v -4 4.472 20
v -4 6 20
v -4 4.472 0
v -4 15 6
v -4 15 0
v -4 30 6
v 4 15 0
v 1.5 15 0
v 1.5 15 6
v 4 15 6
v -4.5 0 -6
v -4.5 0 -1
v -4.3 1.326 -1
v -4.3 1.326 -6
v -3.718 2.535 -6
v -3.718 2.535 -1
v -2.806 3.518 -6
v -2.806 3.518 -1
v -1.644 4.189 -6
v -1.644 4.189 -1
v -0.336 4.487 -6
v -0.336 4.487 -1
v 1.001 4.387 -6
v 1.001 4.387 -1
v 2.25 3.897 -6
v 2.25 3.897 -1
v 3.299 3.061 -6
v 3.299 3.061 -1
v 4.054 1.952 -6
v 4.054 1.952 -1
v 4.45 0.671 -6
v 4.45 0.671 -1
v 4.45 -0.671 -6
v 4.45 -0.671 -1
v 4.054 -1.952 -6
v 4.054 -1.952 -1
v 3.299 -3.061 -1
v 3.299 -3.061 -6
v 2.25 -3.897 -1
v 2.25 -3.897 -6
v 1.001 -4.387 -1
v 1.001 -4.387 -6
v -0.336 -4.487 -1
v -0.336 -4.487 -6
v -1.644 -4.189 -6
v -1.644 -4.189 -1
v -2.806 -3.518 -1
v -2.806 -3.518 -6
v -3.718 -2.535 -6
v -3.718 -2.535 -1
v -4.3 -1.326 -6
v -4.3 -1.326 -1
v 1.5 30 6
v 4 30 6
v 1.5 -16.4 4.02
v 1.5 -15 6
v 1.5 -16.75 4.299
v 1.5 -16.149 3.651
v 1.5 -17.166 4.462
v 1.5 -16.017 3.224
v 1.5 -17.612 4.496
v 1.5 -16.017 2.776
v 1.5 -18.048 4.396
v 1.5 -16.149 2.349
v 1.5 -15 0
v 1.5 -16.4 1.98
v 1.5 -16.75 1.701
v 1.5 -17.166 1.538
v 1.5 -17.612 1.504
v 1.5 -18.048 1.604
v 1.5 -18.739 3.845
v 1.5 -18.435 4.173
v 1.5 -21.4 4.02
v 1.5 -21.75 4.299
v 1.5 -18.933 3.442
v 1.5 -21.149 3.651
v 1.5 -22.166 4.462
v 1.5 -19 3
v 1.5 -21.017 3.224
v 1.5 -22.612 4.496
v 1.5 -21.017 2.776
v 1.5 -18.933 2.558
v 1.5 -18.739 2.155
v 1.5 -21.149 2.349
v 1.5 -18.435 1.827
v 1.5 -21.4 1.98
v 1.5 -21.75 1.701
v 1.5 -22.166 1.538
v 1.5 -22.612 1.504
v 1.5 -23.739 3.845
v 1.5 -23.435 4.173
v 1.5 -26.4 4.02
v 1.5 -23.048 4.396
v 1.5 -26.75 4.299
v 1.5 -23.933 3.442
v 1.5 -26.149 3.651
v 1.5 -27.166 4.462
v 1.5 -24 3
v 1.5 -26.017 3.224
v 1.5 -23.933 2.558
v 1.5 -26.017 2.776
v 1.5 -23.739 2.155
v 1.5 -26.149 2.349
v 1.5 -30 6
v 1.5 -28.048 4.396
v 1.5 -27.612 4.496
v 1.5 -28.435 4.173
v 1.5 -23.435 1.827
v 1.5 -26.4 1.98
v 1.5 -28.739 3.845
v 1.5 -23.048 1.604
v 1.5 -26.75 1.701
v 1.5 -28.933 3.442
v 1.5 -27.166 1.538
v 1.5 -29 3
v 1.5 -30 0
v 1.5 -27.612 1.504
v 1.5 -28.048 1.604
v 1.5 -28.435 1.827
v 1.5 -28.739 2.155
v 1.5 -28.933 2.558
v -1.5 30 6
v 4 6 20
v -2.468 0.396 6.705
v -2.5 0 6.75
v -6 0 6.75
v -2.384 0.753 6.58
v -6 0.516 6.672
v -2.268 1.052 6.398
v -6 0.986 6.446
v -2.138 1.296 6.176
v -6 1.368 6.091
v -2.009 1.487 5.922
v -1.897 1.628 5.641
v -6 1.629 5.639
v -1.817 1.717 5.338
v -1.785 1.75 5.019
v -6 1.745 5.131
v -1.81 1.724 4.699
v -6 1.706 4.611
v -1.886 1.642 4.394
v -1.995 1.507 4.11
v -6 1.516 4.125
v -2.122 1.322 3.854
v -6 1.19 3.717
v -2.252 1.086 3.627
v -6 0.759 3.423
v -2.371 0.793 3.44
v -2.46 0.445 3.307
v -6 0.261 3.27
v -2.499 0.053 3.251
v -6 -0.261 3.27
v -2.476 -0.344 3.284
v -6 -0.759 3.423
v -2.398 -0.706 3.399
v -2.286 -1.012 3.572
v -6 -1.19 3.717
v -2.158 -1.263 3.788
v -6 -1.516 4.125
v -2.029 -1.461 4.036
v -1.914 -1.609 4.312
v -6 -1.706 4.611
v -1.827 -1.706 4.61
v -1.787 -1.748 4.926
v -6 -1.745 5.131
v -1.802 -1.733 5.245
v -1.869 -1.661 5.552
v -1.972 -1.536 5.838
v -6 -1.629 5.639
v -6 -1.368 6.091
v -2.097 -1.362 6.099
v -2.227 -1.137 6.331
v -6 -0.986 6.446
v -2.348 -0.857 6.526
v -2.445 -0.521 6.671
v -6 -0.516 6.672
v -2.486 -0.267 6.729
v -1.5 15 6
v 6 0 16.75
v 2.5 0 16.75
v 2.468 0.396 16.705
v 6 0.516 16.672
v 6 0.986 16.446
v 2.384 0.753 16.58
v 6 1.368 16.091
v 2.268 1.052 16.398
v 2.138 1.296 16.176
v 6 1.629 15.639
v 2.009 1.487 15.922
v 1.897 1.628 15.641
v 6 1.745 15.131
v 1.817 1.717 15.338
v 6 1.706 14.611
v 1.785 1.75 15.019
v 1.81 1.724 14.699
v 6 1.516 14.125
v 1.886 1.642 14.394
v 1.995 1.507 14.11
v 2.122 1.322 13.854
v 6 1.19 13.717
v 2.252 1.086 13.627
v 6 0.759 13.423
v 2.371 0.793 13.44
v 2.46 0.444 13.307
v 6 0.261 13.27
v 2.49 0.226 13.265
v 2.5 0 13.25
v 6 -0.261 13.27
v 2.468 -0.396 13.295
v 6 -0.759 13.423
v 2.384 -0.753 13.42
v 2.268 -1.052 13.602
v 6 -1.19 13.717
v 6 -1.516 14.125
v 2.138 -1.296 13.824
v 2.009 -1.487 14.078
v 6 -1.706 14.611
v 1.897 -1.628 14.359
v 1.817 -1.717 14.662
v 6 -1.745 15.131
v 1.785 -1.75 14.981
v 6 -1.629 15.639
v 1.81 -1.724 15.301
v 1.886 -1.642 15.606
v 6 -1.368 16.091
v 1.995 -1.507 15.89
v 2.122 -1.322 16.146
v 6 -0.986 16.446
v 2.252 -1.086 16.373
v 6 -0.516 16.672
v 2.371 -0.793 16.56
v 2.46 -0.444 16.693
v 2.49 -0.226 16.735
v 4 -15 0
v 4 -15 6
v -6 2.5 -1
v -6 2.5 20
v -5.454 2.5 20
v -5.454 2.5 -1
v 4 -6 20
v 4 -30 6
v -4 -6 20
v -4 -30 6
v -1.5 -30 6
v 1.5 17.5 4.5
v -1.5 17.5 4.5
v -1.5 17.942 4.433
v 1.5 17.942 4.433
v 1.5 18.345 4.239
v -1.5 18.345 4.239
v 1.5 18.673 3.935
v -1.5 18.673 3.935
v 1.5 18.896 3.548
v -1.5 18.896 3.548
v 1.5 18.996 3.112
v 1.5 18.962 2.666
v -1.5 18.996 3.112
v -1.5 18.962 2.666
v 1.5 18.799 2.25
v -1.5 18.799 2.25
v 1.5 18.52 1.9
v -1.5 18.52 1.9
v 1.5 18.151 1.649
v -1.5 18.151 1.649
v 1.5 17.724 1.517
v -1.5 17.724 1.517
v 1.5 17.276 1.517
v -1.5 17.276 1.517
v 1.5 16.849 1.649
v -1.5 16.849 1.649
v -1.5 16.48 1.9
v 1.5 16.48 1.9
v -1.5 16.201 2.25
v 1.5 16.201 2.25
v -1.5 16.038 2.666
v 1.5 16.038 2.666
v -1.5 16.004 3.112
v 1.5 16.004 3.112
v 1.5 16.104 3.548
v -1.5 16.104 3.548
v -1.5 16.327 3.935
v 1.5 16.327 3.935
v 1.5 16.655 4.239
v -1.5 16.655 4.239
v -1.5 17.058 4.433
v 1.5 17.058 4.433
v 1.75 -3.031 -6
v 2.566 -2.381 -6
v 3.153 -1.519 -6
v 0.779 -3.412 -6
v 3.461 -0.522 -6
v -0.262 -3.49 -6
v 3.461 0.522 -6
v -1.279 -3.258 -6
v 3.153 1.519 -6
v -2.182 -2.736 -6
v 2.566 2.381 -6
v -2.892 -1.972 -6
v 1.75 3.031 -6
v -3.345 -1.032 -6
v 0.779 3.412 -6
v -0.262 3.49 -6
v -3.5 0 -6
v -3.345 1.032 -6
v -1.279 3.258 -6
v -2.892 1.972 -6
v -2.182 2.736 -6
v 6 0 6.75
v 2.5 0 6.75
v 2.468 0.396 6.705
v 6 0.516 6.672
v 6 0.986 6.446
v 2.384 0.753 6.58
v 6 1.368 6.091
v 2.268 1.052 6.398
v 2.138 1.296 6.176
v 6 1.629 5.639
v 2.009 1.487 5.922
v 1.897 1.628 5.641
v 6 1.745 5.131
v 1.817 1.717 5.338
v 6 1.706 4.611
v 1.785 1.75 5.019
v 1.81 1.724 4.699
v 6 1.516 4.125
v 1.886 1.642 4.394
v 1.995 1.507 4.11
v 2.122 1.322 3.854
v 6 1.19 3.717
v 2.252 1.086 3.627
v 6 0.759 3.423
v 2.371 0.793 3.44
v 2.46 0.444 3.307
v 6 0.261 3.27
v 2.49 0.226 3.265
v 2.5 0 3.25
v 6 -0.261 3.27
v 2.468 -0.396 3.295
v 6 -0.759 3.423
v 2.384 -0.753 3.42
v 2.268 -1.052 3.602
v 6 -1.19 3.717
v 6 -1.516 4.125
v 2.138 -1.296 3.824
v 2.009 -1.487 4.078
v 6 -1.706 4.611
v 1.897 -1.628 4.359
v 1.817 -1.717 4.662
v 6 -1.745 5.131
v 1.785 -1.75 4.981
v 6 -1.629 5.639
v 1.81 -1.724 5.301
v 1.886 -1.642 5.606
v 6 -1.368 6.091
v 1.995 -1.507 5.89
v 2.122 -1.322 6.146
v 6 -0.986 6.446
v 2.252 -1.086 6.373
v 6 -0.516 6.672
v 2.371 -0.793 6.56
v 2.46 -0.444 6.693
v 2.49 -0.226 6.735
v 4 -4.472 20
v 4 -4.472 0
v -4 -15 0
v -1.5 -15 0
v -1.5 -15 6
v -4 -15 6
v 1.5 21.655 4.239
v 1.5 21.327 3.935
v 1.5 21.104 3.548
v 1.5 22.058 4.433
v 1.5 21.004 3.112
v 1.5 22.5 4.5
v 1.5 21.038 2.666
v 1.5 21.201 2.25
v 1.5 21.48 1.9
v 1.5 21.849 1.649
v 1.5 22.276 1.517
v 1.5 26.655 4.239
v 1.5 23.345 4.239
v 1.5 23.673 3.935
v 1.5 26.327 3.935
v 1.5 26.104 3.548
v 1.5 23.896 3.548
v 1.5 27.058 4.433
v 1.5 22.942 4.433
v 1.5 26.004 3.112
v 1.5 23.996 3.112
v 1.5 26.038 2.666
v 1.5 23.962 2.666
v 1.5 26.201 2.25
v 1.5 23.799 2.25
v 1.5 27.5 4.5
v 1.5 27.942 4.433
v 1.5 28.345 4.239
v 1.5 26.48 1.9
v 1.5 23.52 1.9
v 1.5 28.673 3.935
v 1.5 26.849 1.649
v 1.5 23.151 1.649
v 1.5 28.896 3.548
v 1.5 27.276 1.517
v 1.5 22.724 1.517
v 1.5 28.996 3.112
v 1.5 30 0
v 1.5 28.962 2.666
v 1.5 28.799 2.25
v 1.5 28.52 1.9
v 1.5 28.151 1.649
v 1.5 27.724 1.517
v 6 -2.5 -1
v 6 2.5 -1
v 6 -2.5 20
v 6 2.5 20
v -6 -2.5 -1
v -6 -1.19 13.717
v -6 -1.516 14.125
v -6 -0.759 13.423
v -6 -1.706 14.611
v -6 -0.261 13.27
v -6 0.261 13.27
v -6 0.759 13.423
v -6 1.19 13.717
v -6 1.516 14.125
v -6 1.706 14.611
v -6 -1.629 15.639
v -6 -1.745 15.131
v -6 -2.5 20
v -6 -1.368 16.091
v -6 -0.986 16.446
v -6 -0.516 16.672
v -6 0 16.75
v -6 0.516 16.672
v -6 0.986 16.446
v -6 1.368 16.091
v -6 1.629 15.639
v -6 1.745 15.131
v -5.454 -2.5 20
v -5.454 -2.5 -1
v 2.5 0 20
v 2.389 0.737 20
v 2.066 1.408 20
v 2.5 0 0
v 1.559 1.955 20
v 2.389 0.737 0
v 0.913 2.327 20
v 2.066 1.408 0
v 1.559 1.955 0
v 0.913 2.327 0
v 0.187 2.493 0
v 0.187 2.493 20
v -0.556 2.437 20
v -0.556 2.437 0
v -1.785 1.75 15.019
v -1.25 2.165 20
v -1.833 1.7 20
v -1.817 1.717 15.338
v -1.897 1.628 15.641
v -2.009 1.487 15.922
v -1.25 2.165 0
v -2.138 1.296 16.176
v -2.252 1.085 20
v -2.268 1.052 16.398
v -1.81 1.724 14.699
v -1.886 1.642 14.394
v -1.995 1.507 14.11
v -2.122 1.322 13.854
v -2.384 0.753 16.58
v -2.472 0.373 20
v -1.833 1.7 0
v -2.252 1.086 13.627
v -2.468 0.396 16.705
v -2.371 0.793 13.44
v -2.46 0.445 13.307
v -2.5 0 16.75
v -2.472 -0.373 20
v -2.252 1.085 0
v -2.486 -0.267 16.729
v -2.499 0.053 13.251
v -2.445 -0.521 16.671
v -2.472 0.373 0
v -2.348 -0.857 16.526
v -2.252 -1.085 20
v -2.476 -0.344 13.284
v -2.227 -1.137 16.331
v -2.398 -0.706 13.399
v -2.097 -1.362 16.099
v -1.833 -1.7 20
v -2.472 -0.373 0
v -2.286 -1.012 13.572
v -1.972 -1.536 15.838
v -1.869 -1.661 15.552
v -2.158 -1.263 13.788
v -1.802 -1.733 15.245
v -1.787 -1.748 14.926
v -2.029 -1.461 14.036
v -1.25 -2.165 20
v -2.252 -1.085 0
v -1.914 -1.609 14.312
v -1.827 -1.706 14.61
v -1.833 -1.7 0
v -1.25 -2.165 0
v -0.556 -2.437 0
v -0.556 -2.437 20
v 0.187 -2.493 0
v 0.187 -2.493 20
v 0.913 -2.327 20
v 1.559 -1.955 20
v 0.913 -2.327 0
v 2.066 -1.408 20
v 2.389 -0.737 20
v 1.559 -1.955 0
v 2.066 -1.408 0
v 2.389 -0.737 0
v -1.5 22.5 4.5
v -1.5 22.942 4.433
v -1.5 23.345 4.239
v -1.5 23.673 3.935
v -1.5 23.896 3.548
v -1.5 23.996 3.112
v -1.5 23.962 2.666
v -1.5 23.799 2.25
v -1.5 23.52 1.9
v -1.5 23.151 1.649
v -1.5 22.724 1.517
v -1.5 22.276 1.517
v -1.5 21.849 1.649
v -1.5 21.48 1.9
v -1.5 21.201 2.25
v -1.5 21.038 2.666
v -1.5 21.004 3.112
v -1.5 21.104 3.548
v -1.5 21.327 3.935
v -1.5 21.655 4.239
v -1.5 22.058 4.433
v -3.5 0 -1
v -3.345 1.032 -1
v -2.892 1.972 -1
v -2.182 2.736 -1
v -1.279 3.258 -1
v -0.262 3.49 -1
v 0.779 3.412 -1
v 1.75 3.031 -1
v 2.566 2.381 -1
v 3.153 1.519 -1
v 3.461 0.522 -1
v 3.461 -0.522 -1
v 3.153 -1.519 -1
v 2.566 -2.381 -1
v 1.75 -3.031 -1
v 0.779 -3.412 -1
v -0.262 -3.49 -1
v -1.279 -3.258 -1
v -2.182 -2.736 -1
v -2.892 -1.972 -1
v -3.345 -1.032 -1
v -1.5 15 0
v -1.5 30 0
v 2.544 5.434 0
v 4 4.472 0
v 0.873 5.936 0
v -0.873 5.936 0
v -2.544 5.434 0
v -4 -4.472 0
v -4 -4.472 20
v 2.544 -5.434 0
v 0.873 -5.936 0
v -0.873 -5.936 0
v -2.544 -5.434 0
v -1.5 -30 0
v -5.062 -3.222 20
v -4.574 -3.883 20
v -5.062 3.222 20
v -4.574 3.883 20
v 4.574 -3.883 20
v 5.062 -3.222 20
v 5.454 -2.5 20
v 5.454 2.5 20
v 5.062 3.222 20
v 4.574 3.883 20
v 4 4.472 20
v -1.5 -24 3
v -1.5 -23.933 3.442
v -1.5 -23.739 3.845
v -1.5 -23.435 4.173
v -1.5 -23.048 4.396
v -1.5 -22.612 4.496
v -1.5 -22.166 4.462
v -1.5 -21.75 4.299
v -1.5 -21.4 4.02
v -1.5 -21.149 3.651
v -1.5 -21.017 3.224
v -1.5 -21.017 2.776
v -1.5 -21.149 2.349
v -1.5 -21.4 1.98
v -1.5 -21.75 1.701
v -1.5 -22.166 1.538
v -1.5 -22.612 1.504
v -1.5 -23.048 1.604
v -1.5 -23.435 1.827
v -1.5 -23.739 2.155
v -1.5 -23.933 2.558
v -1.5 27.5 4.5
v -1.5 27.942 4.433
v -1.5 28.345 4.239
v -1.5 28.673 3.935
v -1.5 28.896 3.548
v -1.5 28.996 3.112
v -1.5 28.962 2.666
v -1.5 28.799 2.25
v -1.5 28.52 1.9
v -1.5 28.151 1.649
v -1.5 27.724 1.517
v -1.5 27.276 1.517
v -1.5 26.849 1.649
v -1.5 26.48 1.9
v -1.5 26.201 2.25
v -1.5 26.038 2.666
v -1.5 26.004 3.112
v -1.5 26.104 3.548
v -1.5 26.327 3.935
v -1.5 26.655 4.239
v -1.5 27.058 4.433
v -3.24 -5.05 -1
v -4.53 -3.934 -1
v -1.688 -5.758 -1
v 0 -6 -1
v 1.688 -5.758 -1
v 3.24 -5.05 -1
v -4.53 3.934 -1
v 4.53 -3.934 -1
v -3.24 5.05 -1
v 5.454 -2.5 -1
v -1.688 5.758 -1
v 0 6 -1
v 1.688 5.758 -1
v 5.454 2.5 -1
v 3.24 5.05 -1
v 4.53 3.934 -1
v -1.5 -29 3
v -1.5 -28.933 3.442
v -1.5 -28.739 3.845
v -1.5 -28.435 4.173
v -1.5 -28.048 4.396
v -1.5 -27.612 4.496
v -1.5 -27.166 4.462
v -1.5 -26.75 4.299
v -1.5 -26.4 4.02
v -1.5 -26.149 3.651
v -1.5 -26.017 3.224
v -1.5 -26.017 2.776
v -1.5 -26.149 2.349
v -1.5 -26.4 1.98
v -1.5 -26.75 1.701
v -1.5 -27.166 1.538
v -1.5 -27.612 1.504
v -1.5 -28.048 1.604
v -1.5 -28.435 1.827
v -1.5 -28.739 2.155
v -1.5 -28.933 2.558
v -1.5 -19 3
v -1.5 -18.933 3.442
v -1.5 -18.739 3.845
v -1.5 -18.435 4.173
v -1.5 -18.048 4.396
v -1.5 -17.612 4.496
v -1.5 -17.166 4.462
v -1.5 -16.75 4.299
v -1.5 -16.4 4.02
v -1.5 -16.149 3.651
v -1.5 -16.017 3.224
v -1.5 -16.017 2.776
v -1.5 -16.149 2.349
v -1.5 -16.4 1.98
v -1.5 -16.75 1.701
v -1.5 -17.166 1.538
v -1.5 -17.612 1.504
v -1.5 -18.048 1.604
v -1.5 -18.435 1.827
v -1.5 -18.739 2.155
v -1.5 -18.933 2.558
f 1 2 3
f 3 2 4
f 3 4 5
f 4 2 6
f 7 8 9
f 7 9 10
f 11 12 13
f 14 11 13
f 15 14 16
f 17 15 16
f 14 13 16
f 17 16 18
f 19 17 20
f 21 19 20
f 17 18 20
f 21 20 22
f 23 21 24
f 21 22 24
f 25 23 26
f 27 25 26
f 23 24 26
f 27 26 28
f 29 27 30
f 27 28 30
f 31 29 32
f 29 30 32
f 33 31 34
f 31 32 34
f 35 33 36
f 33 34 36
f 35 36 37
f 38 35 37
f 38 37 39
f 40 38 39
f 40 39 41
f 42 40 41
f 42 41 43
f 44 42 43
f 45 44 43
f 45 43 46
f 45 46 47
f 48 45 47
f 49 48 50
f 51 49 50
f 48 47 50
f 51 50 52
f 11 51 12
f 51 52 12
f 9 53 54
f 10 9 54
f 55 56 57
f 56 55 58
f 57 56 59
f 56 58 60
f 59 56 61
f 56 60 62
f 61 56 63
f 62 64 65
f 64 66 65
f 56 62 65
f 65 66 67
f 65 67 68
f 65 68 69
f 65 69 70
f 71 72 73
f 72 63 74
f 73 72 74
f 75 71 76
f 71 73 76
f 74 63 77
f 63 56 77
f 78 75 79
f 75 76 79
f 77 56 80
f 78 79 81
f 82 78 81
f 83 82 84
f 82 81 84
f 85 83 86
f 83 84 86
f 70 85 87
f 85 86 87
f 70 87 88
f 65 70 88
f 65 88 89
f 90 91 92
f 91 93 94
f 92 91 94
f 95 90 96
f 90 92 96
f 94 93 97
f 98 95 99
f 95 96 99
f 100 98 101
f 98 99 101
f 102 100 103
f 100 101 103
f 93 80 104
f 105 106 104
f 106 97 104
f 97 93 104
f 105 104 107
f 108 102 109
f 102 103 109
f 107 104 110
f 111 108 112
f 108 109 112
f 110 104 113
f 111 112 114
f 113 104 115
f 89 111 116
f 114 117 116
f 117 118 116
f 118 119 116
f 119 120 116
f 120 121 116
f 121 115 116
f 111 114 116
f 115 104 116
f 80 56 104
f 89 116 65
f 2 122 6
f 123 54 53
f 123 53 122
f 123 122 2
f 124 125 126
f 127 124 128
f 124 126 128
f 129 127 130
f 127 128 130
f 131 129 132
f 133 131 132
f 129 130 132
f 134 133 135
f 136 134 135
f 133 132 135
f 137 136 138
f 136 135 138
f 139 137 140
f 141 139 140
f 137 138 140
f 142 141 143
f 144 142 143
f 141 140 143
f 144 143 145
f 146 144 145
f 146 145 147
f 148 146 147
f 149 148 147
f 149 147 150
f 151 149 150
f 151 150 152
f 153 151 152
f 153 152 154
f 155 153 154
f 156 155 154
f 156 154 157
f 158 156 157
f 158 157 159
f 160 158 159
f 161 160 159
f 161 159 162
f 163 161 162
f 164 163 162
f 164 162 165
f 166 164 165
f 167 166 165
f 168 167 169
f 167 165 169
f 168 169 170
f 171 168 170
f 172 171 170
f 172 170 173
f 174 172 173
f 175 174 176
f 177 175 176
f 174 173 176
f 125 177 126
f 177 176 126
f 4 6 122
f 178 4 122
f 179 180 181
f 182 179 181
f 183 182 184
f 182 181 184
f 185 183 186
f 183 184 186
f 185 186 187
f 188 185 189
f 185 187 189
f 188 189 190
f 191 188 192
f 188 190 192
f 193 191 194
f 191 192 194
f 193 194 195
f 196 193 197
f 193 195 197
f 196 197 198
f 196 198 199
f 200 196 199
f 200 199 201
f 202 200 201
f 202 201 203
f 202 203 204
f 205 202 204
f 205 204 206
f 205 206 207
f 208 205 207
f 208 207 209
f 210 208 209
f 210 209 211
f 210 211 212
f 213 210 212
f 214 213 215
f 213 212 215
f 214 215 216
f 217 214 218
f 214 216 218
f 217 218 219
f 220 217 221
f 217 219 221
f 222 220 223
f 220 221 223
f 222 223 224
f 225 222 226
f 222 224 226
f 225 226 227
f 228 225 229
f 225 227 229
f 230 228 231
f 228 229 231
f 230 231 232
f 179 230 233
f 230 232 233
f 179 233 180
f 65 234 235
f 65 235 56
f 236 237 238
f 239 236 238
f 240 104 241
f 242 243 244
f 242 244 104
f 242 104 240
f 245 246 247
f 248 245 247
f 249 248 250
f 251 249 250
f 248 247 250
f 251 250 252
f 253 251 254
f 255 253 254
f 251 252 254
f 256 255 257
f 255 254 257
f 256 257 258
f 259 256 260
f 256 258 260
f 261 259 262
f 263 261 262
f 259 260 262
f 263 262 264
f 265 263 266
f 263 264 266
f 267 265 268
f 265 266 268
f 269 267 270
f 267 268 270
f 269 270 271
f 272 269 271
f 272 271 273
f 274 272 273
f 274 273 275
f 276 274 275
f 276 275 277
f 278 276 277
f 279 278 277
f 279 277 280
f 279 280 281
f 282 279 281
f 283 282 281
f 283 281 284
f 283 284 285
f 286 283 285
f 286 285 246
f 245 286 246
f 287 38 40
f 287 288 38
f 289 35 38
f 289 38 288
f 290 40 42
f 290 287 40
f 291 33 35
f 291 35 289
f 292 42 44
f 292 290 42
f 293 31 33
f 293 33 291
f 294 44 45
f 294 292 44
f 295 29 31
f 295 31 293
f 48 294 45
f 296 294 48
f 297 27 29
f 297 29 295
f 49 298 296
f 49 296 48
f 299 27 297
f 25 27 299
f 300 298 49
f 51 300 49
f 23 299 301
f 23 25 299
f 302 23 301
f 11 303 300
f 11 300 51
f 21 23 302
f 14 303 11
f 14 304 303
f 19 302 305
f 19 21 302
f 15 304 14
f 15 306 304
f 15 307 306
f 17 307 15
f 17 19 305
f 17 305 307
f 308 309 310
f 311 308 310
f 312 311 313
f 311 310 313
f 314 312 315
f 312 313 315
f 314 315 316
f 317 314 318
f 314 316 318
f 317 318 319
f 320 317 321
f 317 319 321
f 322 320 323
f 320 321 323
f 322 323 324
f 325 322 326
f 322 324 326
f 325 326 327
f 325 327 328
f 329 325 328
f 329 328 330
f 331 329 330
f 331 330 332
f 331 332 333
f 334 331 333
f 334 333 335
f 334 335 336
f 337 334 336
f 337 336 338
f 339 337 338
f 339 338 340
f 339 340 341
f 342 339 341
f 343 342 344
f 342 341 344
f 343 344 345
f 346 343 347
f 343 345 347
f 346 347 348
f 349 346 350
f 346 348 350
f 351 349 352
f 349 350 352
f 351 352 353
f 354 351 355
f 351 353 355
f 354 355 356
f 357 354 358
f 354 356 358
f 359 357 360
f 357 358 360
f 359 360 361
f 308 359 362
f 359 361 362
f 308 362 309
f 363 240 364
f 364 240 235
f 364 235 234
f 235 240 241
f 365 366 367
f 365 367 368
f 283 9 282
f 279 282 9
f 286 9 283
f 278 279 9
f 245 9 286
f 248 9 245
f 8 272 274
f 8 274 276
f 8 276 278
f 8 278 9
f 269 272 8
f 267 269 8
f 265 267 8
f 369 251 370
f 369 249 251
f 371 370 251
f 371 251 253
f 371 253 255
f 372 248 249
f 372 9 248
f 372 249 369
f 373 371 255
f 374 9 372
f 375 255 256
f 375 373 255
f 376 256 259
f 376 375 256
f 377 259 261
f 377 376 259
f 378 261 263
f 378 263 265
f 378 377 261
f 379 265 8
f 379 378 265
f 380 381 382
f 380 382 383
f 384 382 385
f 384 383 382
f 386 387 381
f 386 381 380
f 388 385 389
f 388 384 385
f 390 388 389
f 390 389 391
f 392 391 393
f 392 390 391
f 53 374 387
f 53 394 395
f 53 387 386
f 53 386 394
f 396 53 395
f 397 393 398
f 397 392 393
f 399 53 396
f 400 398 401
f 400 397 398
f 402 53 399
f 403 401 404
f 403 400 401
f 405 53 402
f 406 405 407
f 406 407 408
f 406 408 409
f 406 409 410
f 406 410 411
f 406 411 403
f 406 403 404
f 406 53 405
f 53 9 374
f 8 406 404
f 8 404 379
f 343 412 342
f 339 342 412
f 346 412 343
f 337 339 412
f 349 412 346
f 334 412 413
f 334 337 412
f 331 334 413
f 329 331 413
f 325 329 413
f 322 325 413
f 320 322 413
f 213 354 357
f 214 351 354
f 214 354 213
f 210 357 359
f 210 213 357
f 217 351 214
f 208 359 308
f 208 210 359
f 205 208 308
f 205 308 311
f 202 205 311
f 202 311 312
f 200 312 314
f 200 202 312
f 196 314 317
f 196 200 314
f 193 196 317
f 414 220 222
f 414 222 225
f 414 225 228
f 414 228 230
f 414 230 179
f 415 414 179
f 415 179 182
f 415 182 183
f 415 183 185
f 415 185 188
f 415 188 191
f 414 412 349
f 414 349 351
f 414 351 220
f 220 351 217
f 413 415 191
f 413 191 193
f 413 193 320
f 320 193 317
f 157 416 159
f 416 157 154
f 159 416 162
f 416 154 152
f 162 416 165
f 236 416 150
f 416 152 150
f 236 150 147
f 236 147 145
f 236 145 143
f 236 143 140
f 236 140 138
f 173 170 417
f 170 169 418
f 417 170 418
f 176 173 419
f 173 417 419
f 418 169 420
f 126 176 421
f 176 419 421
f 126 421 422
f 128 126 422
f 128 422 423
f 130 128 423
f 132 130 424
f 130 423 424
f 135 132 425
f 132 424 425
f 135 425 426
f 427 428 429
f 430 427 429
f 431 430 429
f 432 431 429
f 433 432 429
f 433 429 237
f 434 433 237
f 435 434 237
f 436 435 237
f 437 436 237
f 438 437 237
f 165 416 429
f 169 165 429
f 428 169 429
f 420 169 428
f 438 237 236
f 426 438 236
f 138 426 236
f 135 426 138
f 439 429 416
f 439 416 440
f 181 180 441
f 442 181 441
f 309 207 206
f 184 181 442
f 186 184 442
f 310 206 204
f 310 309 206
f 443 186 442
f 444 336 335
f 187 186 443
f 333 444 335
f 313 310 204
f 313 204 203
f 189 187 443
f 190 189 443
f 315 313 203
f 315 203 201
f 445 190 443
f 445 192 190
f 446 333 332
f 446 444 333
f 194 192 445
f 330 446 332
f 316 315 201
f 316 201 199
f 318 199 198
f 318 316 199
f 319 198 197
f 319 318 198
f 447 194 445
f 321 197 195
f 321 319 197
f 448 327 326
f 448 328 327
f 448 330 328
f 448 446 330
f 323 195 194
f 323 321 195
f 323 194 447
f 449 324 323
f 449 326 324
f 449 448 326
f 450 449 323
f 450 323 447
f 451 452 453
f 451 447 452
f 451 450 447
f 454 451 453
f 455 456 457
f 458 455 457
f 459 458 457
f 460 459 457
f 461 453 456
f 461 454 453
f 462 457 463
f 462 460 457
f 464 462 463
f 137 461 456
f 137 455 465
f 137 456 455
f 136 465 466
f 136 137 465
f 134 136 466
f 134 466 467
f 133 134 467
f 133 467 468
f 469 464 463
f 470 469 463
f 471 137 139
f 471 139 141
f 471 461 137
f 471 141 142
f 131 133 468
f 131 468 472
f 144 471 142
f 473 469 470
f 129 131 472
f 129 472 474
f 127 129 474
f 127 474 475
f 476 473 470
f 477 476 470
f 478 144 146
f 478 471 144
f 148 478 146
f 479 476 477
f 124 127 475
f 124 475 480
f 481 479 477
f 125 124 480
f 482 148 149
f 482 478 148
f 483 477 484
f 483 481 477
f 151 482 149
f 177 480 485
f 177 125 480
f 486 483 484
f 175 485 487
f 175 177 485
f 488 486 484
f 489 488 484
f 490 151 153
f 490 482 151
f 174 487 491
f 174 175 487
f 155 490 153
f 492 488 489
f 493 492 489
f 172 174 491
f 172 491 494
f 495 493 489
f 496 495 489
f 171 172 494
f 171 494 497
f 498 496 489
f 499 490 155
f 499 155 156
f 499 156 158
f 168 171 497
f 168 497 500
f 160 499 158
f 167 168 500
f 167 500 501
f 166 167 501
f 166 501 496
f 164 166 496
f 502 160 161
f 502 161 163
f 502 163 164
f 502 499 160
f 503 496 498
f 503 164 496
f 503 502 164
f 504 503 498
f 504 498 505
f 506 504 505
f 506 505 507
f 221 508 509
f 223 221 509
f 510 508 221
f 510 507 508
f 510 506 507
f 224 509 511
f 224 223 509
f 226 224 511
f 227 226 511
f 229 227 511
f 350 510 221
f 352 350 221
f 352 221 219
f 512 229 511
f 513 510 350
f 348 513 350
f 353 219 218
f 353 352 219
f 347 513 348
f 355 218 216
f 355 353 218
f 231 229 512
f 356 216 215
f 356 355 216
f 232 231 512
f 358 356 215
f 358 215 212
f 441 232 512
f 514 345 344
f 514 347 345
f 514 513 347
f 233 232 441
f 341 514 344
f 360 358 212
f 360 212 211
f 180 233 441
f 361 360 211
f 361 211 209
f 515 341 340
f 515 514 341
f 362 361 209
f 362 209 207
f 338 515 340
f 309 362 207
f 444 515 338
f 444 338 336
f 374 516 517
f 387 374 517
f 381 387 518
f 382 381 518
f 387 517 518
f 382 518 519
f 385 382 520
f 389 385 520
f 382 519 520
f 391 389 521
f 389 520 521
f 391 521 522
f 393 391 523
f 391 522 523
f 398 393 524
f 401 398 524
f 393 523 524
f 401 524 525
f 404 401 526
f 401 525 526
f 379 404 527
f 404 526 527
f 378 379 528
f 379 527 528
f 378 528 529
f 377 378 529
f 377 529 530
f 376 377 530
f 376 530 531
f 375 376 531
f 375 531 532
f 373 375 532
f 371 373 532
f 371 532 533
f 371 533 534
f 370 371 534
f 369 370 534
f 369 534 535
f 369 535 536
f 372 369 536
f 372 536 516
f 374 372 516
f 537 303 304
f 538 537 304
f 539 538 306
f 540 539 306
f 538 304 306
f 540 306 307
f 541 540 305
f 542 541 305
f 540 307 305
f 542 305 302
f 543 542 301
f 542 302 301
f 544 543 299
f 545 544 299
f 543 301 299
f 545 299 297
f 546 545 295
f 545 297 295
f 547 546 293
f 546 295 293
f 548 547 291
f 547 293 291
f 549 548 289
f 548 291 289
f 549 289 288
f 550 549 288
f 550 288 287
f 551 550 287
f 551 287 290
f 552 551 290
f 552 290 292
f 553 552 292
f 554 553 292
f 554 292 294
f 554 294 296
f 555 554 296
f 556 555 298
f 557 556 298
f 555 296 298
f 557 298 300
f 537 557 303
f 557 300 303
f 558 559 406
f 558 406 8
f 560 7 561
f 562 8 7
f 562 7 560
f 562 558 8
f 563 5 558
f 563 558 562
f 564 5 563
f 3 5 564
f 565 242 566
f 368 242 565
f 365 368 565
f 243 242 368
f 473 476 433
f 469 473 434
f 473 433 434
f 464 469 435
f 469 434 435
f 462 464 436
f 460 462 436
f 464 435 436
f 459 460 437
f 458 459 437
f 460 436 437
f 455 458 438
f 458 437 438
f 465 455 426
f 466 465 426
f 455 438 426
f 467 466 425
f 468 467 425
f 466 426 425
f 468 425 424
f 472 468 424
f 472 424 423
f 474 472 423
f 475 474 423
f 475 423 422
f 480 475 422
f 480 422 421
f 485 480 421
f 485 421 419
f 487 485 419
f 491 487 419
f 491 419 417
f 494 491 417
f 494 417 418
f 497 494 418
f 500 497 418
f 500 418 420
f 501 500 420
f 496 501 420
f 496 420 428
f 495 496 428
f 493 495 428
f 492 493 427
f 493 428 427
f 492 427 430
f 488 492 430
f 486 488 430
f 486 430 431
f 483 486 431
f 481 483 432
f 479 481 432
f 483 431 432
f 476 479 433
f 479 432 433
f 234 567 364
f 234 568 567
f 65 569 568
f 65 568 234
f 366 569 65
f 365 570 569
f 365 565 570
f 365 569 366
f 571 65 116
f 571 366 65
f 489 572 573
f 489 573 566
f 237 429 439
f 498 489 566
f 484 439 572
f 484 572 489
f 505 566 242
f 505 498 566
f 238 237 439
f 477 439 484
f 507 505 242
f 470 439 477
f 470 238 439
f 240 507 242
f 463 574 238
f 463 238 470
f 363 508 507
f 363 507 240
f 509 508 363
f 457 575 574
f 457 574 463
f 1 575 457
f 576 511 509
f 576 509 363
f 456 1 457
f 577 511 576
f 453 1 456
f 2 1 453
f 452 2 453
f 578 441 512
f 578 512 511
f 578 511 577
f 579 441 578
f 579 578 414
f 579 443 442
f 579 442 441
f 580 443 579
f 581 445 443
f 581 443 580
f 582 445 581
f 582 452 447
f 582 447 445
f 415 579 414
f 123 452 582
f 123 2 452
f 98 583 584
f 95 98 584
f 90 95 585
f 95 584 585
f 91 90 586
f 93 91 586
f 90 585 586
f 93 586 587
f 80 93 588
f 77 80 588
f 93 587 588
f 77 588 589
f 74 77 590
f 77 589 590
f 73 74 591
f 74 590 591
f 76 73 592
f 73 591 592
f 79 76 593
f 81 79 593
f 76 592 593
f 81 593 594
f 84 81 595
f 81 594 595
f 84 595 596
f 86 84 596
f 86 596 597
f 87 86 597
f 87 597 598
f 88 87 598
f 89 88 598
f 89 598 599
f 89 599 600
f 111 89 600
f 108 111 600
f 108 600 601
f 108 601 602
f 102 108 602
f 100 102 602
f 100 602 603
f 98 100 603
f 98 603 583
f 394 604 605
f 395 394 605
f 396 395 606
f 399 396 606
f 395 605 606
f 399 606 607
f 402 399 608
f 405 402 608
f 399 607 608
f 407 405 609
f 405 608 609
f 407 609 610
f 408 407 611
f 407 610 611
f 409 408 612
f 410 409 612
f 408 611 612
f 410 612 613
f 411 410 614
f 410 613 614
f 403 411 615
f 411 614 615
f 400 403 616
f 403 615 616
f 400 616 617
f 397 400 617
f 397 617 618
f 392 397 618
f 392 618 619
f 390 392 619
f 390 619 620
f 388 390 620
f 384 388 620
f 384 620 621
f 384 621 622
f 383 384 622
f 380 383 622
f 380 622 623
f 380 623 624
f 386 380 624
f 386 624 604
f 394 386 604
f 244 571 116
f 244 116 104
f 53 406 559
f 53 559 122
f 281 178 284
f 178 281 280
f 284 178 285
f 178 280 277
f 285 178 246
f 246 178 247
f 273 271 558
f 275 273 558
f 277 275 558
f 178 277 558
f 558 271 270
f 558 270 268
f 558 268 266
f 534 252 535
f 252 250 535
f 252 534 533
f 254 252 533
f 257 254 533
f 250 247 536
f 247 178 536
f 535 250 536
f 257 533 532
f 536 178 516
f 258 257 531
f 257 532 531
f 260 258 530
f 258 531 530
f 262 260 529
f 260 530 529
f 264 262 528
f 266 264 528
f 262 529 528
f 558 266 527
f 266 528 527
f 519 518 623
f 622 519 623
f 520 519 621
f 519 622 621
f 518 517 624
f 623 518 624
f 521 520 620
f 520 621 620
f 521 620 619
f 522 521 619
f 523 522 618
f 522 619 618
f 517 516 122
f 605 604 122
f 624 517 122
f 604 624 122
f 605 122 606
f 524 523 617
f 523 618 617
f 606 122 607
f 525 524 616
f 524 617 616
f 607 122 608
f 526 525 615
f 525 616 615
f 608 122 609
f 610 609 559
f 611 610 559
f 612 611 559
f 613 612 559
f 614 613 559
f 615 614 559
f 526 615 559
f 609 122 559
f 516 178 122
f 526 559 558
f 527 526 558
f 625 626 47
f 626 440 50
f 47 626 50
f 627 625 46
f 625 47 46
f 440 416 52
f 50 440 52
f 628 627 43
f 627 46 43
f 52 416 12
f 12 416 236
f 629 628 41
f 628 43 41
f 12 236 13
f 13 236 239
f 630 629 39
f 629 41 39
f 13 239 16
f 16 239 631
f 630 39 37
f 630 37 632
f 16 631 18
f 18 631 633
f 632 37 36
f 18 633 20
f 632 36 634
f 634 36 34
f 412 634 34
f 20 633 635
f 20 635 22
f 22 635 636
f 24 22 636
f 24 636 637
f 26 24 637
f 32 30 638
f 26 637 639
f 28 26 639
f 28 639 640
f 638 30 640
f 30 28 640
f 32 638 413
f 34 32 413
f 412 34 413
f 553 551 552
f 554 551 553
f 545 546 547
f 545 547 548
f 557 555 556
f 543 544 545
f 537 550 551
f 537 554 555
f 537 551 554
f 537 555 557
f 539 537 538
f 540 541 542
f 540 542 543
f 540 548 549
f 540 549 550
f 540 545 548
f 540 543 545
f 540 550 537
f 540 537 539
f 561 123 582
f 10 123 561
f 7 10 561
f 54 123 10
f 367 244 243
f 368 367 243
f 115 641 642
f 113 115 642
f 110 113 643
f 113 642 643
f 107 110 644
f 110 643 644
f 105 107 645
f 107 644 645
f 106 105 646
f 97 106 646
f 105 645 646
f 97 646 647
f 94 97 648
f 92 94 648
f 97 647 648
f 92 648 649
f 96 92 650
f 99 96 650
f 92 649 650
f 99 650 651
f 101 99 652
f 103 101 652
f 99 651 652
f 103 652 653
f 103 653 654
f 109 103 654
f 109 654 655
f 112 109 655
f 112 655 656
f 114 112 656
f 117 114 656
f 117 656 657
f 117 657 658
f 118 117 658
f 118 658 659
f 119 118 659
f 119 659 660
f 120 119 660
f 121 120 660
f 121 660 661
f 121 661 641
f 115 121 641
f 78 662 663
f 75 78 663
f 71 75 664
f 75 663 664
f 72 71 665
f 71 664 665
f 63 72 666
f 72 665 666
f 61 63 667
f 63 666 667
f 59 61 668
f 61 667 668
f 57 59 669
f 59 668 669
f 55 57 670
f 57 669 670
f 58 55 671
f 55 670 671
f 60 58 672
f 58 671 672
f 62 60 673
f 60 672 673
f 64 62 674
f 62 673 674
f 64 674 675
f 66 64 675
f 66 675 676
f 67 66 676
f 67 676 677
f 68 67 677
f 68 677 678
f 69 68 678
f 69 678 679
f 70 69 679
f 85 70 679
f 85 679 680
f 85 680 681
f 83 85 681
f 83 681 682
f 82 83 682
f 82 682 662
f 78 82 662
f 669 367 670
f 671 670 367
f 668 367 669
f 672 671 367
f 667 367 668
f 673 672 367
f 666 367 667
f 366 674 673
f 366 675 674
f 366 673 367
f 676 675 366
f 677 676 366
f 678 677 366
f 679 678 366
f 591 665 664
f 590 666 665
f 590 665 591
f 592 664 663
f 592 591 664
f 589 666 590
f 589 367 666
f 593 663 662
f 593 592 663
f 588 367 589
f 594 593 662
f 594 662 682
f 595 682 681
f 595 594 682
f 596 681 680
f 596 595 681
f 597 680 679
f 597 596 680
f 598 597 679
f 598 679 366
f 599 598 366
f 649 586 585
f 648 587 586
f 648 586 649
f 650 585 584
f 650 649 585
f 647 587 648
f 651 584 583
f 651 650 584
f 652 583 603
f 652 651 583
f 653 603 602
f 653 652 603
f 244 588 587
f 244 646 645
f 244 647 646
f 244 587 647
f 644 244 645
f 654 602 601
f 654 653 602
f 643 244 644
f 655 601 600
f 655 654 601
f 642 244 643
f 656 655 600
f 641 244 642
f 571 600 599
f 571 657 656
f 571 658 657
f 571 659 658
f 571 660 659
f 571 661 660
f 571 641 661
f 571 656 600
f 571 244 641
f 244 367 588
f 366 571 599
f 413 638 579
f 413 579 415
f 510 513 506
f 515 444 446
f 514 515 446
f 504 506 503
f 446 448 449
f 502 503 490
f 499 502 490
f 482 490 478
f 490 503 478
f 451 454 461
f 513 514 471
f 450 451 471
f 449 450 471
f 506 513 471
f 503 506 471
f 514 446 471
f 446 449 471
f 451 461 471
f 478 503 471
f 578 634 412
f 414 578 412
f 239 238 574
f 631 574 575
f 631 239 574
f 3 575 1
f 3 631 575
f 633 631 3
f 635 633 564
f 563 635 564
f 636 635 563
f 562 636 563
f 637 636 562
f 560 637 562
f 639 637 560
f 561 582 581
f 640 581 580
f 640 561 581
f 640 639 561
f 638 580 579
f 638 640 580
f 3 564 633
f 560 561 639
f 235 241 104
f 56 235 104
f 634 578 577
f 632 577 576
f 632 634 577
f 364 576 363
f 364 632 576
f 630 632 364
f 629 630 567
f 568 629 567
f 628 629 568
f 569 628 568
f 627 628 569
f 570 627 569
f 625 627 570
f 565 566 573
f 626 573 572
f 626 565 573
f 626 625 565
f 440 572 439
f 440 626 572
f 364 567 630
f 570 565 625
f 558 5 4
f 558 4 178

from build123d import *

# Parameters (mm, degrees)
SKETCH1_R             = 6
SKETCH1_R_2           = 2.5
BOSS_EXTRUDE1_DEPTH   = 20
BOSS_EXTRUDE2_DEPTH   = 4
SKETCH3_W             = 2.5
SKETCH3_H             = 6
CUT_EXTRUDE1_DEPTH    = 15
BODY_MOVE_COPY1_ANGLE = 180
BOSS_EXTRUDE3_START   = 1
SKETCH4_R             = 6
BOSS_EXTRUDE3_DEPTH   = 1
SKETCH5_R             = 4.5
BOSS_EXTRUDE4_DEPTH   = 5
SKETCH6_R             = 3.5
CUT_EXTRUDE2_DEPTH    = 5
SKETCH7_W             = 1.05927087
SKETCH7_H             = 5
SKETCH7_W_2           = 1.30456568
BOSS_EXTRUDE5_DEPTH   = 21
SKETCH8_R             = 1.75
CUT_EXTRUDE3_DEPTH    = 39
SKETCH9_R             = 1.5
CUT_EXTRUDE4_DEPTH    = 37.827299731
SKETCH11_R            = 1.5
CUT_EXTRUDE5_DEPTH    = 37.827299731


with BuildPart() as part:
    # Sketch1 → Boss-Extrude1 (new body)
    with BuildSketch(Plane.XY):
        Circle(SKETCH1_R)
        Circle(SKETCH1_R_2, mode=Mode.SUBTRACT)
    extrude(amount=BOSS_EXTRUDE1_DEPTH)

    # Sketch2 → Boss-Extrude2 (add, symmetric)
    with BuildSketch(Plane(origin=(0, 0, 0), x_dir=(0, 0, -1), z_dir=(1, 0, 0))):
        Polygon((-20, 6), (-20, 3), (0, 3), (0, 30), (-6, 30), align=None)
    extrude(amount=BOSS_EXTRUDE2_DEPTH, both=True)

    # Sketch3 → Cut-Extrude1 (cut)
    with BuildSketch(Plane(origin=(0, 30, 0), x_dir=(1, 0, 0), z_dir=(0, 1, 0))):
        with Locations((-2.75, -3)):
            Rectangle(SKETCH3_W, SKETCH3_H)
        with Locations((2.75, -3)):
            Rectangle(SKETCH3_W, SKETCH3_H)
    extrude(amount=-CUT_EXTRUDE1_DEPTH, mode=Mode.SUBTRACT)


with BuildPart() as body_2:
    # Body-Move/Copy1: copy of part
    add(part.part.rotate(Axis((0, 0, 0), (0, 0, 1)), BODY_MOVE_COPY1_ANGLE))


with BuildPart() as part_1:
    add(part.part)

    add(body_2.part)  # Boss-Extrude3 merges body 2
    # Sketch4 → Boss-Extrude3 (add)
    with BuildSketch(Plane(origin=(0, 0, 0), x_dir=(-1, 0, 0), z_dir=(0, 0, -1)).offset(BOSS_EXTRUDE3_START)):
        Circle(SKETCH4_R)
    extrude(amount=-BOSS_EXTRUDE3_DEPTH)

    # Sketch5 → Boss-Extrude4 (add)
    with BuildSketch(Plane(origin=(0, 0, -1), x_dir=(-1, 0, 0), z_dir=(0, 0, -1))):
        Circle(SKETCH5_R)
    extrude(amount=BOSS_EXTRUDE4_DEPTH)

    # Sketch6 → Cut-Extrude2 (cut)
    with BuildSketch(Plane(origin=(0, 0, -6), x_dir=(-1, 0, 0), z_dir=(0, 0, -1))):
        Circle(SKETCH6_R)
    extrude(amount=-CUT_EXTRUDE2_DEPTH, mode=Mode.SUBTRACT)

    # Sketch7 → Boss-Extrude5 (add)
    with BuildSketch(Plane.XY.offset(20)):
        with Locations((-5.470364565, 0)):
            Rectangle(SKETCH7_W, SKETCH7_H)
        with Locations((5.34771716, 0)):
            Rectangle(SKETCH7_W_2, SKETCH7_H)
    extrude(amount=-BOSS_EXTRUDE5_DEPTH)

    # Sketch8 → Cut-Extrude3 (cut, through all)
    with BuildSketch(Plane.ZY.offset(6)):
        with Locations((5, 0)):
            Circle(SKETCH8_R)
        with Locations((15, 0)):
            Circle(SKETCH8_R)
    extrude(amount=-CUT_EXTRUDE3_DEPTH, mode=Mode.SUBTRACT)

    # Sketch9 → Cut-Extrude4 (cut, through all)
    with BuildSketch(Plane.ZY.offset(1.5)):
        with Locations((3, 17.5)):
            Circle(SKETCH9_R)
        with Locations((3, 22.5)):
            Circle(SKETCH9_R)
        with Locations((3, 27.5)):
            Circle(SKETCH9_R)
    extrude(amount=-CUT_EXTRUDE4_DEPTH, mode=Mode.SUBTRACT)

    # Sketch11 → Cut-Extrude5 (cut, through all)
    with BuildSketch(Plane.ZY.offset(1.5)):
        with Locations(Location((3, -17.5, 0), (0, 0, 270))):
            Circle(SKETCH11_R)
        with Locations(Location((3, -22.5, 0), (0, 0, 270))):
            Circle(SKETCH11_R)
        with Locations(Location((3, -27.5, 0), (0, 0, 270))):
            Circle(SKETCH11_R)
    extrude(amount=-CUT_EXTRUDE5_DEPTH, mode=Mode.SUBTRACT)


solid = part_1.part
